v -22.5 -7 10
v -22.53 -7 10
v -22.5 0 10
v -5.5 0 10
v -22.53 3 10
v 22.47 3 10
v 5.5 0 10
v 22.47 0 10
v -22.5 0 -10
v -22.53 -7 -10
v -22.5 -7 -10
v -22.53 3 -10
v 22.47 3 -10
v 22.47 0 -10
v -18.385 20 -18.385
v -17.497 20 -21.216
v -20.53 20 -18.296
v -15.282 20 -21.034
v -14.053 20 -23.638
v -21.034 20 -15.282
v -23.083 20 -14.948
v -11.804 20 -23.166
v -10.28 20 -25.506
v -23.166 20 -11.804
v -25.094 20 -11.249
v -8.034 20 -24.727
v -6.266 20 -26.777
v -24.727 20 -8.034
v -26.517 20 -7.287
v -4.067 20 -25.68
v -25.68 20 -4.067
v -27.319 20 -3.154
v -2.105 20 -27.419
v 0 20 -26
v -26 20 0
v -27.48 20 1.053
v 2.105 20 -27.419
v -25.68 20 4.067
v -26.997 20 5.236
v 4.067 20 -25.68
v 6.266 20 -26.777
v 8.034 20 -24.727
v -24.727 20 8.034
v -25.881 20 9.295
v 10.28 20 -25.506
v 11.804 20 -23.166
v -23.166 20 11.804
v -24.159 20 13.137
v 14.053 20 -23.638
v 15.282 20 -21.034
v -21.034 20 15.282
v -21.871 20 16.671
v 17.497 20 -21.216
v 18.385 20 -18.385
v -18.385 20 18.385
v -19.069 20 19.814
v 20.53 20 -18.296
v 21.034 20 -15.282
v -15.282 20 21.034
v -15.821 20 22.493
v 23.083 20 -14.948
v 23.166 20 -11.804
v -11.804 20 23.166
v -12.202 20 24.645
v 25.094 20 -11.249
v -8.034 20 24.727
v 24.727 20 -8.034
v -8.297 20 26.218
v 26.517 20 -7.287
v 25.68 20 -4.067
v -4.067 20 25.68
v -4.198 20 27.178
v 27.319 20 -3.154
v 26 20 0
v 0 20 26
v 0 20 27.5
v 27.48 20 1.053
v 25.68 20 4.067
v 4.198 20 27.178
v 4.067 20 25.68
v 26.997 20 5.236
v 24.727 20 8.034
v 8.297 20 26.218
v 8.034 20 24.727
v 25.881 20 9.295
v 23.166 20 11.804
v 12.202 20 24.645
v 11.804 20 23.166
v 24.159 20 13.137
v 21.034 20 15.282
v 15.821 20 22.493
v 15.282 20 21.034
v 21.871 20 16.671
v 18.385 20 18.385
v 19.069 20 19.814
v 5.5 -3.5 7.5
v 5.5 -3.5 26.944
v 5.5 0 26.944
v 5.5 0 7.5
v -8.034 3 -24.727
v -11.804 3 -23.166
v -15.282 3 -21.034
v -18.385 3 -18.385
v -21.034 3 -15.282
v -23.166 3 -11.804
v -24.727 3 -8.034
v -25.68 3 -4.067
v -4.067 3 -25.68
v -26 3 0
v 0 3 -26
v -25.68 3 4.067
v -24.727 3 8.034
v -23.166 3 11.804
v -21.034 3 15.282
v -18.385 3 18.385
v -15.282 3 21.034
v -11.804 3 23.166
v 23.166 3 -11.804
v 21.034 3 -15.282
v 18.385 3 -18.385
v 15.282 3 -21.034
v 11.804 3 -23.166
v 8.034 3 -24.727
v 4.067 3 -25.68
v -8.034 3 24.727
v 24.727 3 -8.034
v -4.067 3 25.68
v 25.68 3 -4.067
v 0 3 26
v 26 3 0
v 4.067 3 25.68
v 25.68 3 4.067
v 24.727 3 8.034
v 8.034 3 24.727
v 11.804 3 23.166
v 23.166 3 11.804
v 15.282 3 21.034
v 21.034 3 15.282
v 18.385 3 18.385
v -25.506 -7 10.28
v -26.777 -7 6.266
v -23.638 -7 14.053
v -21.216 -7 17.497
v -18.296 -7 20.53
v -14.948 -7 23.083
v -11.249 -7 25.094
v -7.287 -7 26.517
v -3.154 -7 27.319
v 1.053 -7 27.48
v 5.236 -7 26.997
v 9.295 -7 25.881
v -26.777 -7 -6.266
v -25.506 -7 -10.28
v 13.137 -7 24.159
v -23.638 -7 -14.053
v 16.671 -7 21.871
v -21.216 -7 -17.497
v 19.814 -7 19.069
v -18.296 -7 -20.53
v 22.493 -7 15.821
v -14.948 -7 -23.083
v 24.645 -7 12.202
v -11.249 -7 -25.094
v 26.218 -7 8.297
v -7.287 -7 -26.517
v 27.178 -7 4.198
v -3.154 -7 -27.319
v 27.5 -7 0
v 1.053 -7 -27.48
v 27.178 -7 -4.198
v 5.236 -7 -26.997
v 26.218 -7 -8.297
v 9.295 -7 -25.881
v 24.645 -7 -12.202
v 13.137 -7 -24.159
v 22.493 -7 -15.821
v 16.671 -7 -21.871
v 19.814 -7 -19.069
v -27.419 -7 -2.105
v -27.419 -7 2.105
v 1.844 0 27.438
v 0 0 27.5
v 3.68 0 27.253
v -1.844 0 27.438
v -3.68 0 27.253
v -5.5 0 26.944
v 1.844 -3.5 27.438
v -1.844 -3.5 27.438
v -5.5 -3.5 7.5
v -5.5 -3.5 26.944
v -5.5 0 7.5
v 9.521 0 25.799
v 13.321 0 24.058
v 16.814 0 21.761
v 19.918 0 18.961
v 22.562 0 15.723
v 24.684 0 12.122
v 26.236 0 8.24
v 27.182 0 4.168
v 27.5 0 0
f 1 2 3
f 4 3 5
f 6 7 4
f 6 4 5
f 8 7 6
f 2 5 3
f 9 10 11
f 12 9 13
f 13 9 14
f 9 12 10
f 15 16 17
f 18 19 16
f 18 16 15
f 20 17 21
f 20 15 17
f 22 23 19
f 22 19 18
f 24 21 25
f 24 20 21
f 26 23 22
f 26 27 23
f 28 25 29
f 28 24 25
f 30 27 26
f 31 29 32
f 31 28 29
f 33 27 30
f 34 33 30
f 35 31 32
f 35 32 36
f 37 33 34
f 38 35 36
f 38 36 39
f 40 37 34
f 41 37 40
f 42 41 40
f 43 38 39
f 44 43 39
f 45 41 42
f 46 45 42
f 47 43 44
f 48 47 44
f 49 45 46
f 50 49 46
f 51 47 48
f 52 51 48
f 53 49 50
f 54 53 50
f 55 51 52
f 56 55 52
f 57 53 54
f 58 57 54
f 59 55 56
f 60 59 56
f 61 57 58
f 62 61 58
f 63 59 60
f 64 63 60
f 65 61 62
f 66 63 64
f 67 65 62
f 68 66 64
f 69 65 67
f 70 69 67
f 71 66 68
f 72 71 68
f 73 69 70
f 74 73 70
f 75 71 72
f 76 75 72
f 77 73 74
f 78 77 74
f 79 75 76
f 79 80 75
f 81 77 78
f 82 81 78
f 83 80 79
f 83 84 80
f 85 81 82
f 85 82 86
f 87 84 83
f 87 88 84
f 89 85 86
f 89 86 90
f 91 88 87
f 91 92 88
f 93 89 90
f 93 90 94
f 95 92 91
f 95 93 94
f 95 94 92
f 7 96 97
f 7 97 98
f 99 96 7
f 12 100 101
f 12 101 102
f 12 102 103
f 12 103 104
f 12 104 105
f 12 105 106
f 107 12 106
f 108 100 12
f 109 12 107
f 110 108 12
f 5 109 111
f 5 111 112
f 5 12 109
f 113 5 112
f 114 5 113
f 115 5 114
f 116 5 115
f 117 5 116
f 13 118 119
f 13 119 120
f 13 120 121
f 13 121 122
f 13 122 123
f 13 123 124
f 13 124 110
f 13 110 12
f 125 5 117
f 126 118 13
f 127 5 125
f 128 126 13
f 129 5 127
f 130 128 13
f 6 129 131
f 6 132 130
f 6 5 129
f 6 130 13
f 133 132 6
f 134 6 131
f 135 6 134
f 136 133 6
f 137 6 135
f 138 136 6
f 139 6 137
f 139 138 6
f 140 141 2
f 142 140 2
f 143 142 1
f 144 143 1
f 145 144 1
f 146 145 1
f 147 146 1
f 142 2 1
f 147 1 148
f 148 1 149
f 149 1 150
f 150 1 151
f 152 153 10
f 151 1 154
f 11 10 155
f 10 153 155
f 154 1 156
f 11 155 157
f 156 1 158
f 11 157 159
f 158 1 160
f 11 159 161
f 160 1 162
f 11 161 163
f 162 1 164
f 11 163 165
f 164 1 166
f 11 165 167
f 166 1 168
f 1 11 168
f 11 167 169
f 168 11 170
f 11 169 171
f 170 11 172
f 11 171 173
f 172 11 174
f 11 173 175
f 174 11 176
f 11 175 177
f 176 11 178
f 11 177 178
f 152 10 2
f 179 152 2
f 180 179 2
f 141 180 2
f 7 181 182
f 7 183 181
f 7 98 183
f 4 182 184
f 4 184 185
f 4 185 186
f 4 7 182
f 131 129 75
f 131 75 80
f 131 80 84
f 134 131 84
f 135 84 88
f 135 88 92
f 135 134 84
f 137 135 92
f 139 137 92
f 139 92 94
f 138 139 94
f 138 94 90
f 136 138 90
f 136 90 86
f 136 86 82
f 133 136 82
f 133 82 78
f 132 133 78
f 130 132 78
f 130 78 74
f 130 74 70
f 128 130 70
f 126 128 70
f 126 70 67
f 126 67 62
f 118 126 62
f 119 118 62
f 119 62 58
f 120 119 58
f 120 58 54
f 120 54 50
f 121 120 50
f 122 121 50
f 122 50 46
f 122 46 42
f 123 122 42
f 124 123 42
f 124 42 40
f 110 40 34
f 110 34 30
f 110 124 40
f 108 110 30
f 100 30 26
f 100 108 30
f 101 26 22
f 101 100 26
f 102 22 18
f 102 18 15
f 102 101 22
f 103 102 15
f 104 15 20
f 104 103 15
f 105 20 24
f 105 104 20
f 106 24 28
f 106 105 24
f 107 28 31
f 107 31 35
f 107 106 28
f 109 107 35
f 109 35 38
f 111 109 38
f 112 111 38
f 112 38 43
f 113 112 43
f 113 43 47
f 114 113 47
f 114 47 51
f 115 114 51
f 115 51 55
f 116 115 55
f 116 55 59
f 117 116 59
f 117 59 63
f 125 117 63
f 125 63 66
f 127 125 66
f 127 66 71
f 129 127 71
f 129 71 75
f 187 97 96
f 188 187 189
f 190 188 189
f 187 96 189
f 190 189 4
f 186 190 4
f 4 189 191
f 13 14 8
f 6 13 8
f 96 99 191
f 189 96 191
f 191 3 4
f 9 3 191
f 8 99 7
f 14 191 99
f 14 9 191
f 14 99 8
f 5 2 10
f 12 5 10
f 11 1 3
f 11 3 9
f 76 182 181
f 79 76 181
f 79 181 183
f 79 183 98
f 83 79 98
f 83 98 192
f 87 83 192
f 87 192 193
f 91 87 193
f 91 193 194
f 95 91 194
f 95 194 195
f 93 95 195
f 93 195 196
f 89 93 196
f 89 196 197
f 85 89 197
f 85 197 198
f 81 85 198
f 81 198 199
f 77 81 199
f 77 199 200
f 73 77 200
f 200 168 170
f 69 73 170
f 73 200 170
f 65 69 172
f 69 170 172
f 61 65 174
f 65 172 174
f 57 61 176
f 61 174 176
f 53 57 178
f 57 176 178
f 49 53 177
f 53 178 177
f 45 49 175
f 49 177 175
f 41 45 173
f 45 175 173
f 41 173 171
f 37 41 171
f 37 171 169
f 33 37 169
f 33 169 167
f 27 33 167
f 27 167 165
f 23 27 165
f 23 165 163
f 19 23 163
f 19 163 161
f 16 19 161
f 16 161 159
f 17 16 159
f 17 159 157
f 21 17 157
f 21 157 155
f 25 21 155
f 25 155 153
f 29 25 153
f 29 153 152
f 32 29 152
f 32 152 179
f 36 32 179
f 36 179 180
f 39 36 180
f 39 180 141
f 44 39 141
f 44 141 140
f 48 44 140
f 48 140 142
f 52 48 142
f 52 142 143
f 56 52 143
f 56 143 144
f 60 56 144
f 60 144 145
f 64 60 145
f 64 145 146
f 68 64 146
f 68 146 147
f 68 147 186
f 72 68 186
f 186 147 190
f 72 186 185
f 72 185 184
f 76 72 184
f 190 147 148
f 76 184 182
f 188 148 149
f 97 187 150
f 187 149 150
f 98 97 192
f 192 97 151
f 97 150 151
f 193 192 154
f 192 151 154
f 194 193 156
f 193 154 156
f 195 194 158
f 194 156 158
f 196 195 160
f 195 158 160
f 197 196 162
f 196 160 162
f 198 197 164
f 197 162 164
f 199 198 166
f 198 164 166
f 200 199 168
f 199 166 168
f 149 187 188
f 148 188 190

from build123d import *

# Parameters (mm, degrees)
SKETCH1_R           = 27.5
SKETCH1_R_2         = 26
BOSS_EXTRUDE1_DEPTH = 20
SKETCH1_3_R         = 26
BOSS_EXTRUDE2_DEPTH = 3
BOSS_EXTRUDE3_START = -7
SKETCH1_4_R         = 27.5
SKETCH1_4_W         = 0.030258968
SKETCH1_4_H         = 20
BOSS_EXTRUDE3_DEPTH = 7
SKETCH4_W           = 11
SKETCH4_H           = 3.5
CUT_EXTRUDE3_DEPTH  = 2.5
SKETCH4_2_W         = 11
SKETCH4_2_H         = 3.5
CUT_EXTRUDE4_DEPTH  = 51.621141828


with BuildPart() as part:
    # Sketch1 → Boss-Extrude1 (new body)
    with BuildSketch(Plane(origin=(0, 0, 0), x_dir=(1, 0, 0), z_dir=(0, 1, 0))):
        Circle(SKETCH1_R)
        Circle(SKETCH1_R_2, mode=Mode.SUBTRACT)
    extrude(amount=BOSS_EXTRUDE1_DEPTH)

    # Sketch1<3> → Boss-Extrude2 (add)
    with BuildSketch(Plane(origin=(0, 0, 0), x_dir=(1, 0, 0), z_dir=(0, 1, 0))):
        Circle(SKETCH1_3_R)
        Polygon((22.469741032, -10), (-22.5, -10), (-22.530258968, -10), (-22.530258968, 10), (-22.5, 10), (22.469741032, 10), align=None, mode=Mode.SUBTRACT)
    extrude(amount=BOSS_EXTRUDE2_DEPTH)

    # Sketch1<4> → Boss-Extrude3 (add)
    with BuildSketch(Plane(origin=(0, 0, 0), x_dir=(1, 0, 0), z_dir=(0, 1, 0)).offset(BOSS_EXTRUDE3_START)):
        Circle(SKETCH1_4_R)
        with Locations((-22.515129484, 0)):
            Rectangle(SKETCH1_4_W, SKETCH1_4_H, mode=Mode.SUBTRACT)
    extrude(amount=BOSS_EXTRUDE3_DEPTH)

    # Sketch4 → Cut-Extrude3 (cut, symmetric)
    with BuildSketch(Plane(origin=(0, 0, 10), x_dir=(-1, 0, 0), z_dir=(0, 0, -1))):
        with Locations((0, -1.75)):
            Rectangle(SKETCH4_W, SKETCH4_H)
    extrude(amount=CUT_EXTRUDE3_DEPTH, both=True, mode=Mode.SUBTRACT)

    # Sketch4<2> → Cut-Extrude4 (cut, through all)
    with BuildSketch(Plane(origin=(0, 0, 10), x_dir=(-1, 0, 0), z_dir=(0, 0, -1))):
        with Locations((0, -1.75)):
            Rectangle(SKETCH4_2_W, SKETCH4_2_H)
    extrude(amount=-CUT_EXTRUDE4_DEPTH, mode=Mode.SUBTRACT)


solid = part.part
